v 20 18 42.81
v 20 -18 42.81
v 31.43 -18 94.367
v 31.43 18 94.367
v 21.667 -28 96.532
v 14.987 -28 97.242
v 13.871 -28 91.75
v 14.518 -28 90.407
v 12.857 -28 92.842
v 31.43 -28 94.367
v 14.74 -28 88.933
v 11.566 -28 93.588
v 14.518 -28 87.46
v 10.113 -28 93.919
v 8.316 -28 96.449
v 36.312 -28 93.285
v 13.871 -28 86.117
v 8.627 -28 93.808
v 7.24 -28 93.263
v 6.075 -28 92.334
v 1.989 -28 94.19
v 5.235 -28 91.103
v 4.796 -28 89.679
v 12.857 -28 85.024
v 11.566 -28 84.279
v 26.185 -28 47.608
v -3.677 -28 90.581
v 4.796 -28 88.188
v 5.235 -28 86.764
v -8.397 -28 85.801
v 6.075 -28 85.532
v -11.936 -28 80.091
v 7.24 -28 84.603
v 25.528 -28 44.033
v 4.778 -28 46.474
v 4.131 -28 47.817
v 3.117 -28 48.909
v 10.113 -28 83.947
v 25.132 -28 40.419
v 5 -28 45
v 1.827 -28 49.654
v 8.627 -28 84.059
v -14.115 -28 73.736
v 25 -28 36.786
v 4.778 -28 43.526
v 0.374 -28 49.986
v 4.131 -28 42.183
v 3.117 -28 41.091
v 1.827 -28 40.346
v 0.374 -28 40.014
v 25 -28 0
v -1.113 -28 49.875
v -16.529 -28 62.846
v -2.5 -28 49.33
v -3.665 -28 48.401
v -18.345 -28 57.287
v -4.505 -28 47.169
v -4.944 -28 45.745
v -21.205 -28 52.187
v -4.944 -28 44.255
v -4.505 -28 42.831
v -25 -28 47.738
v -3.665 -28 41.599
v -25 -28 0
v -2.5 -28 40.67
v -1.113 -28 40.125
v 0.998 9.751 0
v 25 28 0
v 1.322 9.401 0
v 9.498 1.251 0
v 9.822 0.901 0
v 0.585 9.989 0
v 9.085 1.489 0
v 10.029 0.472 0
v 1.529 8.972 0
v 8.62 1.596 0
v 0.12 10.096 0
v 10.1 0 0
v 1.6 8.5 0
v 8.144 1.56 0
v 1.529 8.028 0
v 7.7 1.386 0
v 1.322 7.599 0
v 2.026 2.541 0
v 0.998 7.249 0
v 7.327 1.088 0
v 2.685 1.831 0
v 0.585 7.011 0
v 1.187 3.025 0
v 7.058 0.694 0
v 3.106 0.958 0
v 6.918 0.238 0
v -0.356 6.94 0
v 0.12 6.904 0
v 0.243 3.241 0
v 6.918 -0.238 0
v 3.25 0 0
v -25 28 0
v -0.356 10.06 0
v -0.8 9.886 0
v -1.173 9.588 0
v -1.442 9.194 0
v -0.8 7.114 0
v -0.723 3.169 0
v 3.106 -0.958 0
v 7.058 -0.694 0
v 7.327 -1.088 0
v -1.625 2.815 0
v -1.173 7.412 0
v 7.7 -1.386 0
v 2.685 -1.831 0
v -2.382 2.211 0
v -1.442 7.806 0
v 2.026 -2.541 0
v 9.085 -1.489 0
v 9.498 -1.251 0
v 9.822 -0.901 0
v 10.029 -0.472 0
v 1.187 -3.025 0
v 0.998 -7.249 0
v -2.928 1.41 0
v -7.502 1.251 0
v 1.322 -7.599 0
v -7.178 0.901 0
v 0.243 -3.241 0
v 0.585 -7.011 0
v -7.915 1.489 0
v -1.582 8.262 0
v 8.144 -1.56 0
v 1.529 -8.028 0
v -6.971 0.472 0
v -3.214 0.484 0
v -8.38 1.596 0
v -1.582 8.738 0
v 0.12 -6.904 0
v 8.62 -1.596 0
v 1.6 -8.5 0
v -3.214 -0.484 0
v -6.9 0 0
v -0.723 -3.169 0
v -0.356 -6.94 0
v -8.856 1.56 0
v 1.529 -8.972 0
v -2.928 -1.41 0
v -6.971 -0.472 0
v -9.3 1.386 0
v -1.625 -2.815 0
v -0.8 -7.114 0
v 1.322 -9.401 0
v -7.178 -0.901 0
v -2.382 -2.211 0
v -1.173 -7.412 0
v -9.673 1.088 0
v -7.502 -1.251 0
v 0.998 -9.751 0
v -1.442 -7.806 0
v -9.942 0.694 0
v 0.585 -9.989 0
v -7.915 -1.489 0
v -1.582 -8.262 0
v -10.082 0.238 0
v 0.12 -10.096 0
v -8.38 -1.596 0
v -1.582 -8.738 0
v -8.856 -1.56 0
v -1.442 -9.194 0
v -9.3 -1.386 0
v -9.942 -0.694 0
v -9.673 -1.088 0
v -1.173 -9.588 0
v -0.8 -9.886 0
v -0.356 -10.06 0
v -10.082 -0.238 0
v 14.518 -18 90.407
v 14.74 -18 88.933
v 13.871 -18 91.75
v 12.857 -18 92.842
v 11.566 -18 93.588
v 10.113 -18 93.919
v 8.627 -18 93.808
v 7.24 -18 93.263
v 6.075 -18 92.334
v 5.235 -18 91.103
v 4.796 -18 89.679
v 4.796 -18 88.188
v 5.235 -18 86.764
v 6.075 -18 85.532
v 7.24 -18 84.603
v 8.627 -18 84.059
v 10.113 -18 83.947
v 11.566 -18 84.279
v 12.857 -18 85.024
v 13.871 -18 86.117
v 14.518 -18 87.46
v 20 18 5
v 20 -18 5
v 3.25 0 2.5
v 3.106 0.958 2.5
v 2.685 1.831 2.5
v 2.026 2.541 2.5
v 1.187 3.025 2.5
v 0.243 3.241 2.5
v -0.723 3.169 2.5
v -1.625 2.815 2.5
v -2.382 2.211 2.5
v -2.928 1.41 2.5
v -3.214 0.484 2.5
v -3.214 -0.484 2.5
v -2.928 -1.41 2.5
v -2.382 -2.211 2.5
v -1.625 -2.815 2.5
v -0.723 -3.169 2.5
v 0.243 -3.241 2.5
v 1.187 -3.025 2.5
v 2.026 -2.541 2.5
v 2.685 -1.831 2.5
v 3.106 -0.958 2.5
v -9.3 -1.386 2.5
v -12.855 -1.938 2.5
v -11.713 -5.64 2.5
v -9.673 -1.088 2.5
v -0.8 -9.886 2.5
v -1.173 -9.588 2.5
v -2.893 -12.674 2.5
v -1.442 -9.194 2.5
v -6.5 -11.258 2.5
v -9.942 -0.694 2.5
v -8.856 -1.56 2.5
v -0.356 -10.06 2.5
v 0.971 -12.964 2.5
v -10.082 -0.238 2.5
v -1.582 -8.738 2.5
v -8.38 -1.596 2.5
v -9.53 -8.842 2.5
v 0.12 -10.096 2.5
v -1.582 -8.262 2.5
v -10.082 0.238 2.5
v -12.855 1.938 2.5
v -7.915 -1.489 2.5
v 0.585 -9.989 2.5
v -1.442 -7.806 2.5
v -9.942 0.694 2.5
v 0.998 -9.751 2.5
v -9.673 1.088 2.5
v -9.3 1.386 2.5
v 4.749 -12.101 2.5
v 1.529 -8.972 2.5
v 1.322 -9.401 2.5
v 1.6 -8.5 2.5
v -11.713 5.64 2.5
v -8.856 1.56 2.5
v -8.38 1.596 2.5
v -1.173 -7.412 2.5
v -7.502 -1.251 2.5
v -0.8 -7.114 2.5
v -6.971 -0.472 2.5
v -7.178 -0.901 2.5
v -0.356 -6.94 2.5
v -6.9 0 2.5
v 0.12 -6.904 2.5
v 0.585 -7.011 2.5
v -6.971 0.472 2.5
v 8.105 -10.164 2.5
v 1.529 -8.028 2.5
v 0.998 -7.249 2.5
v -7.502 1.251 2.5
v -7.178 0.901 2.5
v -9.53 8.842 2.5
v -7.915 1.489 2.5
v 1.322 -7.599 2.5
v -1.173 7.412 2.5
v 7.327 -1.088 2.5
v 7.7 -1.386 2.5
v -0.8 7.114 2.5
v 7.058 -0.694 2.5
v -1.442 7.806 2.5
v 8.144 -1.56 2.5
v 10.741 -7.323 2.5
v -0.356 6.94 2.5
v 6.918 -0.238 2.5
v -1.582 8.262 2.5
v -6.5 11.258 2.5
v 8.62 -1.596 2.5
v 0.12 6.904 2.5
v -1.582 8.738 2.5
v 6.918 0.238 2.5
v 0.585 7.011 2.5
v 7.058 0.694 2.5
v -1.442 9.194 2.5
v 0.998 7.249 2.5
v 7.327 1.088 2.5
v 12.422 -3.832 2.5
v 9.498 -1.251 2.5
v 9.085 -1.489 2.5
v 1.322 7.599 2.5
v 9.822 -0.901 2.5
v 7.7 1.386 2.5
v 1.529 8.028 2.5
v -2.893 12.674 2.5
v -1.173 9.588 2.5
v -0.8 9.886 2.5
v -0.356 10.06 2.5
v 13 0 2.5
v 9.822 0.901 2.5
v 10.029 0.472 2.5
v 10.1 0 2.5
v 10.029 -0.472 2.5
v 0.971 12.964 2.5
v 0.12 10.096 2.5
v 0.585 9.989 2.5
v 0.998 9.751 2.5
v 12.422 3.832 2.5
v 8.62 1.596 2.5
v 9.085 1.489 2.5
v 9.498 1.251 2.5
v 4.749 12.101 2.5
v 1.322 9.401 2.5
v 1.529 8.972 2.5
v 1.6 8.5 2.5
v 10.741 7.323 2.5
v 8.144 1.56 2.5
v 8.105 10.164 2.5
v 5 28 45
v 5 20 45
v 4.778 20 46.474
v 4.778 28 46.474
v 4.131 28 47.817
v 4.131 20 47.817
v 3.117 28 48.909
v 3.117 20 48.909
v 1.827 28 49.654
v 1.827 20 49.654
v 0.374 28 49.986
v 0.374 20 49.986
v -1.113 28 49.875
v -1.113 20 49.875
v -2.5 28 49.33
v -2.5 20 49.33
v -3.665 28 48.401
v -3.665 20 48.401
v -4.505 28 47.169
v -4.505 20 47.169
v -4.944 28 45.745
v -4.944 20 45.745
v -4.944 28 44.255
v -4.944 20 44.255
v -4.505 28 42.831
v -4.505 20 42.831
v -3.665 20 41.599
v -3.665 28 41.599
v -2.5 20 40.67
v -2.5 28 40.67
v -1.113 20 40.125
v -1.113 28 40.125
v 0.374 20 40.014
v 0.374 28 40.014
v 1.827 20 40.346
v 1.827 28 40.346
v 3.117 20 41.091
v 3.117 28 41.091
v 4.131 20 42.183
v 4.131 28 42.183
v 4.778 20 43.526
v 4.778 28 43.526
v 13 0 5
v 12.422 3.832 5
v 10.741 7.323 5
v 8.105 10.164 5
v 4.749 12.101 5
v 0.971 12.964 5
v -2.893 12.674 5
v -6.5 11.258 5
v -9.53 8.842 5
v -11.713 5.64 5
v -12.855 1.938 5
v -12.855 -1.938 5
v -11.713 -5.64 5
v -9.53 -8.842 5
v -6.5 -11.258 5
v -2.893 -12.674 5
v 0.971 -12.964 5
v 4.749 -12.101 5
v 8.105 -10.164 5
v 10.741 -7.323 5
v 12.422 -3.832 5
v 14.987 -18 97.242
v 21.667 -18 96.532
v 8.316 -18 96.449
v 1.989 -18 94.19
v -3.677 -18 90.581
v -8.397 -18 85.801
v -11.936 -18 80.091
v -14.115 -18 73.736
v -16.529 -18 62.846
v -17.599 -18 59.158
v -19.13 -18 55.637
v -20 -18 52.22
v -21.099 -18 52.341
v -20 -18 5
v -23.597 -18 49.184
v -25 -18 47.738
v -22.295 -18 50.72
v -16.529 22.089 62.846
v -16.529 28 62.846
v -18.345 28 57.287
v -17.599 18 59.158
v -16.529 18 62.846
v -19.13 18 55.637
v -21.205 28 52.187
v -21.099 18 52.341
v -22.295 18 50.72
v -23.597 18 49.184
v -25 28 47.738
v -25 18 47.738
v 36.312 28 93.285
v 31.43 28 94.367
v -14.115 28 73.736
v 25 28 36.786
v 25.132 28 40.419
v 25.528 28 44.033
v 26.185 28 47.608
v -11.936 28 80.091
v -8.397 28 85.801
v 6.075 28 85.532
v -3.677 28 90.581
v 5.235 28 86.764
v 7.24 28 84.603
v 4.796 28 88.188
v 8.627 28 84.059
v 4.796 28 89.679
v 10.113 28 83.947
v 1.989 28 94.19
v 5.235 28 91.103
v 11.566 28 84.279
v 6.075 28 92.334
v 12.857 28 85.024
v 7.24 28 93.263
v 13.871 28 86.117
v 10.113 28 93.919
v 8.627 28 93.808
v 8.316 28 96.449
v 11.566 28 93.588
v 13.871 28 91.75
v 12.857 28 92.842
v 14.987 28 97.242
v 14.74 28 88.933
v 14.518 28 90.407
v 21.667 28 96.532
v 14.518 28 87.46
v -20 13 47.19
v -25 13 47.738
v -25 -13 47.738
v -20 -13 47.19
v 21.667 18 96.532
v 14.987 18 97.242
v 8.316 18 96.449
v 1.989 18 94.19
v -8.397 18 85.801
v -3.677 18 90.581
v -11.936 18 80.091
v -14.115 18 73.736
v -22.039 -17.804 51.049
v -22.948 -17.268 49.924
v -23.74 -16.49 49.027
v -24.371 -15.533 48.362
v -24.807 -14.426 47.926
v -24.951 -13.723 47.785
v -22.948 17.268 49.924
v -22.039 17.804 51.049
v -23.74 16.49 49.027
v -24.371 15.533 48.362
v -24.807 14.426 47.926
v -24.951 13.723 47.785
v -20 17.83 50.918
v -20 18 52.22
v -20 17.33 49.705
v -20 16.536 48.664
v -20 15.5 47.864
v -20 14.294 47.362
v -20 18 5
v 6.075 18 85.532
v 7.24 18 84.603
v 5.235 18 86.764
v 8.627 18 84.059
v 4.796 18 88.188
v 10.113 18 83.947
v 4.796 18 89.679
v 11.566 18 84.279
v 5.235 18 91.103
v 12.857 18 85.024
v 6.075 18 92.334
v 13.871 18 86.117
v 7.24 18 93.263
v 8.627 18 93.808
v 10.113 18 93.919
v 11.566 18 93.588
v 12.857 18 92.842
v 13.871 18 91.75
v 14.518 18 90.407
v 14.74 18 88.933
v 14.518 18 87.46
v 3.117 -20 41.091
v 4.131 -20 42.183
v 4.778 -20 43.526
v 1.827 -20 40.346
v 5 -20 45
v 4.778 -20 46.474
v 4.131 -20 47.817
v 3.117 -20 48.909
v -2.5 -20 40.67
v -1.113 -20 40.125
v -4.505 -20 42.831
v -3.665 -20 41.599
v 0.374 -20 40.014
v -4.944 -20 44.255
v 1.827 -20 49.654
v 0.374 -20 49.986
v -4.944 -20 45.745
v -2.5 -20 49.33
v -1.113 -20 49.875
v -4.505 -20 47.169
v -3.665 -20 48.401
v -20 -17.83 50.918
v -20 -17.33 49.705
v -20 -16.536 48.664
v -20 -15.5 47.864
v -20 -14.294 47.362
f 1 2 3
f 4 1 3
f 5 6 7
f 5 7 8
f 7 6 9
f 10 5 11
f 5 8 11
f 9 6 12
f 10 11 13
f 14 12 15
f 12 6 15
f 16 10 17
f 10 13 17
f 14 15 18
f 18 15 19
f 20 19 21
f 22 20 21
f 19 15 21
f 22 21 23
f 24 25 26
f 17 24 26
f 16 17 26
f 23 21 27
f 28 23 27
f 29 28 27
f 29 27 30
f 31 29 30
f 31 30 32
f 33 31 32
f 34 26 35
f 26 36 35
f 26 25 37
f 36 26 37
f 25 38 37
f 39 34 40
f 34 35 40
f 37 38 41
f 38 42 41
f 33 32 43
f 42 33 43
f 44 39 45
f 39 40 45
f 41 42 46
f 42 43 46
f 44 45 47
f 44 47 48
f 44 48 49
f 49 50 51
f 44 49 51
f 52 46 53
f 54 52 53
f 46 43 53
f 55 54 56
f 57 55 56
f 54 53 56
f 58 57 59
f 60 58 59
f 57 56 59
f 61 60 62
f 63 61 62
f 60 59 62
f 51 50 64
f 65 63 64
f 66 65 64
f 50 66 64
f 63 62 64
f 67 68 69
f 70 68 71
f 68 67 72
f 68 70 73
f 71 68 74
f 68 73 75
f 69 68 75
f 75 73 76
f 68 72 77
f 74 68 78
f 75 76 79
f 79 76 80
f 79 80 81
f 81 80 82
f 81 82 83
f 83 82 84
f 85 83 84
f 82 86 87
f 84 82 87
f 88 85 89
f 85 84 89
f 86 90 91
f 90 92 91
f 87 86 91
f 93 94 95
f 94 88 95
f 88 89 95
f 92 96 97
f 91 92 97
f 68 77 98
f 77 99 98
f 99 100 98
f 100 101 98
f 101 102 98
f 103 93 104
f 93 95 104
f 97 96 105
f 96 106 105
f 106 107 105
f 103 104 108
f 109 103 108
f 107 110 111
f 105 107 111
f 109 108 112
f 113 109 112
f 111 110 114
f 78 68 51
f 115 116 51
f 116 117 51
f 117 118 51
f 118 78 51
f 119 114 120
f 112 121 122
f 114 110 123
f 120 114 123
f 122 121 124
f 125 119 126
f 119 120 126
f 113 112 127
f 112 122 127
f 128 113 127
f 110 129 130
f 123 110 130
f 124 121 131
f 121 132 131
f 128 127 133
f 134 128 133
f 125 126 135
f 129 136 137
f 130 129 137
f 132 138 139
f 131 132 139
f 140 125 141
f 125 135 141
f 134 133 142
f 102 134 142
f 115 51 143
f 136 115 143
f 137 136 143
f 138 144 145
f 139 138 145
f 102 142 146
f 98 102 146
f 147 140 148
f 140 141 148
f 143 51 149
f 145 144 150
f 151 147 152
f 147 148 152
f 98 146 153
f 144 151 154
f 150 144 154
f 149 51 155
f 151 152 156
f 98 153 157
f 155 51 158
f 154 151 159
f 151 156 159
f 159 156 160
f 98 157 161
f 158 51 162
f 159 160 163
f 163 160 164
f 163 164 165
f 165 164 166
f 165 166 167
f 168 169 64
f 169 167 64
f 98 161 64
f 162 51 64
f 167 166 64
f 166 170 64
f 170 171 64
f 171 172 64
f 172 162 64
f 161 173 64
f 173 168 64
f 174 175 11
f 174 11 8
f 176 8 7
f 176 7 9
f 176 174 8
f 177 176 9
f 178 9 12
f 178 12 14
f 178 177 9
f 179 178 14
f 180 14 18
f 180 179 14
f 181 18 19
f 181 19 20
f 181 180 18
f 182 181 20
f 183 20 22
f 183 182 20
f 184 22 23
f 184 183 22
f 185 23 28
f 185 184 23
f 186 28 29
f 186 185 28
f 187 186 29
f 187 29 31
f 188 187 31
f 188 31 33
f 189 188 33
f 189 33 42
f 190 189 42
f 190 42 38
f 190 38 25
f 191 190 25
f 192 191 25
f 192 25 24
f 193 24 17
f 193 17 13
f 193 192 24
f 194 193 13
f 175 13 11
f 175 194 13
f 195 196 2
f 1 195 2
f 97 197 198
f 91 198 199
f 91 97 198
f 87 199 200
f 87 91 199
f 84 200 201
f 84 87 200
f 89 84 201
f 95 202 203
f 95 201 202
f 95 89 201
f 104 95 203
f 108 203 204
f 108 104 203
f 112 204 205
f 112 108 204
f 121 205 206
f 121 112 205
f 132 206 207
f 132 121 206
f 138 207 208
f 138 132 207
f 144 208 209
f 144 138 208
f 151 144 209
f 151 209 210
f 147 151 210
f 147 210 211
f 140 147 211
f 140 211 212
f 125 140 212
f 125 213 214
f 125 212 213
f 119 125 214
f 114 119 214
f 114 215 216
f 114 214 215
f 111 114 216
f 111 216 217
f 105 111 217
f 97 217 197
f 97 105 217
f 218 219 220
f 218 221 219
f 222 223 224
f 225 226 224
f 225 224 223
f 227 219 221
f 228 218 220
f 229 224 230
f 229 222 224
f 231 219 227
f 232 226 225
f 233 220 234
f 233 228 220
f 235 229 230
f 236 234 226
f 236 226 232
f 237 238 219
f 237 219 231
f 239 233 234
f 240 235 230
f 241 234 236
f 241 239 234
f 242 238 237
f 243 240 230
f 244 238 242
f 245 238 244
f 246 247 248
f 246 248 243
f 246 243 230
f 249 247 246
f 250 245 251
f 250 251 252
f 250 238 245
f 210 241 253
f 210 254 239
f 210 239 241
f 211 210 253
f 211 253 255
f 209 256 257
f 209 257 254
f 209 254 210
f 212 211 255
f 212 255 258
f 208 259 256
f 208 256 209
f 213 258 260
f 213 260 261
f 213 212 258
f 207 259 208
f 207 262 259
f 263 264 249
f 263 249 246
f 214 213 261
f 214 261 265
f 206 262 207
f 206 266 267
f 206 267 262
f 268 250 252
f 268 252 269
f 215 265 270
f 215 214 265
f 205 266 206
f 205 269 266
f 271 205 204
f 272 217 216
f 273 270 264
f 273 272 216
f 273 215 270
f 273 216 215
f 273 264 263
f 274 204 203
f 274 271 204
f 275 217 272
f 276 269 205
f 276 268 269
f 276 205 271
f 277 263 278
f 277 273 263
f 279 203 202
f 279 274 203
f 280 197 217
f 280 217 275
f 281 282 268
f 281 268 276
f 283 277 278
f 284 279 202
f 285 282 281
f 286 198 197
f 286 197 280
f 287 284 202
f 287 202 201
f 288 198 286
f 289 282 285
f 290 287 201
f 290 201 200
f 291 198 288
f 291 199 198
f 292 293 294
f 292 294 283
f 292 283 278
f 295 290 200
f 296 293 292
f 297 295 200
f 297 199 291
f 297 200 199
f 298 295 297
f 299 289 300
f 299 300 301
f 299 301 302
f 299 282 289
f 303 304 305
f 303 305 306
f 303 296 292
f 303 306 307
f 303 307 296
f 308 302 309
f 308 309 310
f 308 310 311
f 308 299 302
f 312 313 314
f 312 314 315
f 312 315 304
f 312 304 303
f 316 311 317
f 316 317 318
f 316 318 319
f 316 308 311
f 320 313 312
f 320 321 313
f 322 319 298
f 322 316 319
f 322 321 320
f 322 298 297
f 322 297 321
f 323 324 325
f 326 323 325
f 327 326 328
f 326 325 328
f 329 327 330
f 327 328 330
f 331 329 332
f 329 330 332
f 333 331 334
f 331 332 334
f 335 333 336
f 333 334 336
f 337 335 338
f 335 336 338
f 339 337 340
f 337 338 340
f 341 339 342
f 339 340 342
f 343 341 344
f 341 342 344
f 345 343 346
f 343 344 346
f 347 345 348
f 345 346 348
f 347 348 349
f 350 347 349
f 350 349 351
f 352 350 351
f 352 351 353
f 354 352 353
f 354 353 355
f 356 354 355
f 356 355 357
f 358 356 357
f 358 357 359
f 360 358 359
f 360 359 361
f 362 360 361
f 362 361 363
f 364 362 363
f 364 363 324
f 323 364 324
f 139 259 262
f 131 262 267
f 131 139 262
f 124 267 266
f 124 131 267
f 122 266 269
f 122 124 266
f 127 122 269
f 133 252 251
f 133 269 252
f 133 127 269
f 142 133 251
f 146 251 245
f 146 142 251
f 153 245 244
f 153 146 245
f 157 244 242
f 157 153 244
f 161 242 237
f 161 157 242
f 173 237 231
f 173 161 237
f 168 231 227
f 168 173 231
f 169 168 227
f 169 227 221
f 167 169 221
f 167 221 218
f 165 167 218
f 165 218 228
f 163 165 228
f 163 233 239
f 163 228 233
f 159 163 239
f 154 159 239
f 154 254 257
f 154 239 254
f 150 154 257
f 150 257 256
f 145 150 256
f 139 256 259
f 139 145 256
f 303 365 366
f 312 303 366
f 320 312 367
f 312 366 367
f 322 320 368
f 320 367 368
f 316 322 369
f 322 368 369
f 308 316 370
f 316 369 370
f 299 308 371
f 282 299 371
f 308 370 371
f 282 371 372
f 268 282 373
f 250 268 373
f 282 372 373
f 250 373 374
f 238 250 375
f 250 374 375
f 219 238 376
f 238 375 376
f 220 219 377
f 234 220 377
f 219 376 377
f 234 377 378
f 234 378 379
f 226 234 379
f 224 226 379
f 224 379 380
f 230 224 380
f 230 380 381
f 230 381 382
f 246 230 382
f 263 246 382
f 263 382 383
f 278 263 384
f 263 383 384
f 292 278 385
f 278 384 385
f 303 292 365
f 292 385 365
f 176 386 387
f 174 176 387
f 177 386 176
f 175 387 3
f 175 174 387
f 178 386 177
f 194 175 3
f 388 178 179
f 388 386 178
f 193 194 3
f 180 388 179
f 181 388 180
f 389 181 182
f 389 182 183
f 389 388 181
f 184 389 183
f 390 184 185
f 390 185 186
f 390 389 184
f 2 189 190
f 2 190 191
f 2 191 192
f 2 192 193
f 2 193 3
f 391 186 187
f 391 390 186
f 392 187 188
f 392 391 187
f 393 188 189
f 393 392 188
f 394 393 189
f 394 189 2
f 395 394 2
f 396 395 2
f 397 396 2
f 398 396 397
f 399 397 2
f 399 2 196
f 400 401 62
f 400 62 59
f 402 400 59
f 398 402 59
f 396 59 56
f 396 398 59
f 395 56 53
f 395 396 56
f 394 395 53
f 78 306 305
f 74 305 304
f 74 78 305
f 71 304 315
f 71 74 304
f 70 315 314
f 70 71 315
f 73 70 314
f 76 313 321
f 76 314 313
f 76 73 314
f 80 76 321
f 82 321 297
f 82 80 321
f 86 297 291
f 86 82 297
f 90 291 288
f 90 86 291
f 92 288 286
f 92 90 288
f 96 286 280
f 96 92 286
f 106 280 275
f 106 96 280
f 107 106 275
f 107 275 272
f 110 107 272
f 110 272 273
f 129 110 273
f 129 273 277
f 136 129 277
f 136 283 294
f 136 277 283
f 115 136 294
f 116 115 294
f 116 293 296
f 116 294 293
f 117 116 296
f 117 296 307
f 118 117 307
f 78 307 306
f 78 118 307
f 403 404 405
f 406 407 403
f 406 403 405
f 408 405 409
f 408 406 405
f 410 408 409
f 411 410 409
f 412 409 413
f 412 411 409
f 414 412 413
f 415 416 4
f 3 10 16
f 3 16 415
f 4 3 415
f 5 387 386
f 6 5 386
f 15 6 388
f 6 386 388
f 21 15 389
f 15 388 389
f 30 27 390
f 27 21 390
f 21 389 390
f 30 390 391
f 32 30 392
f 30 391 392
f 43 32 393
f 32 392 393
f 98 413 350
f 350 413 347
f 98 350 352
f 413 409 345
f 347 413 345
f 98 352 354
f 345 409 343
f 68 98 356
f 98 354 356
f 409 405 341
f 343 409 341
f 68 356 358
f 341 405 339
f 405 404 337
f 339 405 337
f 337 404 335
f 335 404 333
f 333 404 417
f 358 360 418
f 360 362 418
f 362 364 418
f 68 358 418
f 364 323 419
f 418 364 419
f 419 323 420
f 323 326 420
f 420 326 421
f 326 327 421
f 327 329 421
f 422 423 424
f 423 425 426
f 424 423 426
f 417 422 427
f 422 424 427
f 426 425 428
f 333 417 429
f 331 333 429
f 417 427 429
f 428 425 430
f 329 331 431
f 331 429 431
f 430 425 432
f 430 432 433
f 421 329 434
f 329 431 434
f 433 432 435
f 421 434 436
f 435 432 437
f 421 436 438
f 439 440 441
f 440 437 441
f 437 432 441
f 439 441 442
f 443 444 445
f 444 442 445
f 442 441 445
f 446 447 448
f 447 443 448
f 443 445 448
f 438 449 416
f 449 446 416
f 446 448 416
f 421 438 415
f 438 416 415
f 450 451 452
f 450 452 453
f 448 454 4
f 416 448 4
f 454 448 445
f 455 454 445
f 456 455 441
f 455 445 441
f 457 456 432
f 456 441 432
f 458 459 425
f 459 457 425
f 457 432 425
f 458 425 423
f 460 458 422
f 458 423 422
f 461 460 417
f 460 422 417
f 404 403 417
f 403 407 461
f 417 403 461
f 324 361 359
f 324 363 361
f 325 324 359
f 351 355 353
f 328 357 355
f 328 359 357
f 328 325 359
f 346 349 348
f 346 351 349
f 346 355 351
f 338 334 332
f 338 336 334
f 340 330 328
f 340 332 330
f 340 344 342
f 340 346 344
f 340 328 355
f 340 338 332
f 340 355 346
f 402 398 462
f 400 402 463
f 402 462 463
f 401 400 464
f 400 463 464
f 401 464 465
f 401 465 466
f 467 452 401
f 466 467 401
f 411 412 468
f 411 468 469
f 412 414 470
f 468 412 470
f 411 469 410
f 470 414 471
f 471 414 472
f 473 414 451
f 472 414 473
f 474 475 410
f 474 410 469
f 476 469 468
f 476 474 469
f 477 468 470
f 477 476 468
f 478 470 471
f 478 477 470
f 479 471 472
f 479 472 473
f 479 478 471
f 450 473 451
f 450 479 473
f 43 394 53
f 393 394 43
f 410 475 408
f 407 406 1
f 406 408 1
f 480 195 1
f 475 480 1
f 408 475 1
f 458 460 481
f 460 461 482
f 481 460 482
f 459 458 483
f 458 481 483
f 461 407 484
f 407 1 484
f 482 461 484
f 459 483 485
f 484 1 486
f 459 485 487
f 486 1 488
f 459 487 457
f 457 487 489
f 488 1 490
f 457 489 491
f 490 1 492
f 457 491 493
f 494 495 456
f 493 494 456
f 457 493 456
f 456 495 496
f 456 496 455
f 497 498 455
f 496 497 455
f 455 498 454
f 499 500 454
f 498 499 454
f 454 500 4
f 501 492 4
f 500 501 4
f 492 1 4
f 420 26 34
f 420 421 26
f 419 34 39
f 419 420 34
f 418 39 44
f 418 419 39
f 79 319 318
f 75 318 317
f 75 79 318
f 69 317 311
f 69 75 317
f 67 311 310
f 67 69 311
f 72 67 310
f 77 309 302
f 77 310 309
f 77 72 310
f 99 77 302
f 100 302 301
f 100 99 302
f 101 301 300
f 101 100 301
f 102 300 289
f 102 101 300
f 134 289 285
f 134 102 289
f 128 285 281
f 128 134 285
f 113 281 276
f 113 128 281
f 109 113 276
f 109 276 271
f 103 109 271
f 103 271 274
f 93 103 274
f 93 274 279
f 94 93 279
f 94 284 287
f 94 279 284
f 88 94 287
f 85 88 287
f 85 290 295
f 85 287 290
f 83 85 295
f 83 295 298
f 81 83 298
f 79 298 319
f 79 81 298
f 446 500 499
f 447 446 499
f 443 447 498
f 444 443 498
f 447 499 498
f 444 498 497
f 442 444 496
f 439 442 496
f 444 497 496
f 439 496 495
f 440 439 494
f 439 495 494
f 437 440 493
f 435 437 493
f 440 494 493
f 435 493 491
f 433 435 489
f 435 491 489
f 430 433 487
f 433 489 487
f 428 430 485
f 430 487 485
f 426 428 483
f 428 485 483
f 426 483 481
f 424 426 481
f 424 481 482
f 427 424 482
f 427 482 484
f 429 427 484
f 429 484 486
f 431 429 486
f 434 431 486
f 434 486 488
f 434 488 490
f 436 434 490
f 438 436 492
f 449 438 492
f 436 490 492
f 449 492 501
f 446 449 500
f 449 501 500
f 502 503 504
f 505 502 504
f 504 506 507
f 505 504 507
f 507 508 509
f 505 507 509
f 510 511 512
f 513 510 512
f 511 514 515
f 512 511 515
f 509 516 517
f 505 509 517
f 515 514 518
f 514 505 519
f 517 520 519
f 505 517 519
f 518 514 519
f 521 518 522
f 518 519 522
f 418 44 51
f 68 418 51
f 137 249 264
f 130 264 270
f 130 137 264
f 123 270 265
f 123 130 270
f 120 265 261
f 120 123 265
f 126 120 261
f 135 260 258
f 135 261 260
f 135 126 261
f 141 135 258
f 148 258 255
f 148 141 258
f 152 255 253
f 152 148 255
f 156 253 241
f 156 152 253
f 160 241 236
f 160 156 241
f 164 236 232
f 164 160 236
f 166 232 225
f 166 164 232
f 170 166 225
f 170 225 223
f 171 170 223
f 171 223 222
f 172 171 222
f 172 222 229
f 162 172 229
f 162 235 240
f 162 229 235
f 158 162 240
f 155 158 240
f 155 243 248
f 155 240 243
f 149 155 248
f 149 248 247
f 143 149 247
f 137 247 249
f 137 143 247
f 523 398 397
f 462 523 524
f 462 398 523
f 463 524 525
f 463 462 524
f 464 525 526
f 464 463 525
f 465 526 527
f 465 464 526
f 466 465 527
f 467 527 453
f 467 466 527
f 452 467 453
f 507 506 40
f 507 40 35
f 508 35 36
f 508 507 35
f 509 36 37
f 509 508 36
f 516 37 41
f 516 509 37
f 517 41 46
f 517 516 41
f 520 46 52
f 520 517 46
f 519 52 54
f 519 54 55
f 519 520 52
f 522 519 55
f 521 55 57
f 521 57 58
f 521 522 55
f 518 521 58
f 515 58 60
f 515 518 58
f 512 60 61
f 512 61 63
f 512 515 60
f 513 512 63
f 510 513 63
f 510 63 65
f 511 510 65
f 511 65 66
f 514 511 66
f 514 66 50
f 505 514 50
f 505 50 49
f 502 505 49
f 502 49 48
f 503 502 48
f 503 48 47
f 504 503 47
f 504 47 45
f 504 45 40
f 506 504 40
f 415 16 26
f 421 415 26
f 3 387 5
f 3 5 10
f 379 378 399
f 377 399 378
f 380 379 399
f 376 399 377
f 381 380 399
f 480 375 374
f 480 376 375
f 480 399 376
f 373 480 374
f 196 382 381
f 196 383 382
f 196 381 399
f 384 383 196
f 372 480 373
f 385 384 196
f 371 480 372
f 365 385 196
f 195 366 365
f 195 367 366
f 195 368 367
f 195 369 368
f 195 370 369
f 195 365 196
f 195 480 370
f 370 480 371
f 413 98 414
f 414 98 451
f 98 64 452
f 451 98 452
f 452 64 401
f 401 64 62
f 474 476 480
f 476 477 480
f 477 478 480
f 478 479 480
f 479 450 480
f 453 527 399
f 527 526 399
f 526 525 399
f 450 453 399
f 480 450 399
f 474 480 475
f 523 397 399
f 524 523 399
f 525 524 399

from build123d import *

# Parameters (mm, degrees)
SKETCH_1_W          = 40
SKETCH_1_H          = 36
SKETCH_1_R          = 1.6
SKETCH_1_R_2        = 3.25
EXTRUDE_1_DEPTH     = 5
SKETCH_2_R          = 13
CUT_EXTRUDE_1_DEPTH = 2.5
SKETCH_7_R          = 5
EXTRUDE_2_DEPTH     = 10
SKETCH_10_R         = 5
EXTRUDE_4_DEPTH     = 2
EXTRUDE_3_REACH     = 123.4
FILLET_1_R          = 30
FILLET_2_R          = 50
FILLET_6_R          = 5


with BuildPart() as part:
    # ｽｹｯﾁ1 → ﾎﾞｽ - 押し出し1 (new body)
    with BuildSketch(Plane.XY):
        Rectangle(SKETCH_1_W, SKETCH_1_H)
        with Locations((0, 8.5)):
            Circle(SKETCH_1_R, mode=Mode.SUBTRACT)
        with Locations((8.5, 0)):
            Circle(SKETCH_1_R, mode=Mode.SUBTRACT)
        with Locations((0, -8.5)):
            Circle(SKETCH_1_R, mode=Mode.SUBTRACT)
        with Locations((-8.5, 0)):
            Circle(SKETCH_1_R, mode=Mode.SUBTRACT)
        Circle(SKETCH_1_R_2, mode=Mode.SUBTRACT)
    extrude(amount=EXTRUDE_1_DEPTH)

    # ｽｹｯﾁ2 → ｶｯﾄ - 押し出し1 (cut)
    with BuildSketch(Plane.XY.offset(5)):
        Circle(SKETCH_2_R)
    extrude(amount=-CUT_EXTRUDE_1_DEPTH, mode=Mode.SUBTRACT)

    # ｽｹｯﾁ7 → ﾎﾞｽ - 押し出し2 (add)
    with BuildSketch(Plane.XZ.offset(18)):
        Polygon((-20, 0), (-20, 47.190356234), (-7.621741376, 103.02507267), (31.430098909, 94.367488113), (20, 42.809643766), (20, 0), align=None)
        with Locations((0, 45)):
            Circle(SKETCH_7_R, mode=Mode.SUBTRACT)
        with Locations((9.739782627, 88.93332032)):
            Circle(SKETCH_7_R, mode=Mode.SUBTRACT)
    extrude_2 = extrude(amount=EXTRUDE_2_DEPTH)

    # ｽｹｯﾁ10 → ﾎﾞｽ - 押し出し4 (add)
    with BuildSketch(Plane(origin=(0, -18, 0), x_dir=(1, 0, 0), z_dir=(0, 1, 0))):
        with Locations(Location((0, -45, 0), (0, 0, 180))):
            Circle(SKETCH_10_R)
    extrude_4 = extrude(amount=-EXTRUDE_4_DEPTH)

    # ﾐﾗｰ3: ﾎﾞｽ - 押し出し2, ﾎﾞｽ - 押し出し4 across plane
    add(extrude_2.mirror(Plane.ZX))
    add(extrude_4.mirror(Plane.ZX))

    # ﾎﾞｽ - 押し出し3: up to this face of the body (flat: up to its plane)
    extrude_3_end = Plane(part.part.faces().sort_by_distance((-18.848513106, 28, 23.595178117))[0])
    # ｽｹｯﾁ8 → ﾎﾞｽ - 押し出し3 (add, up to the picked face)
    with BuildSketch(Plane.XZ.offset(28), mode=Mode.PRIVATE) as extrude_3_sk1:
        Polygon((-20, 47.190356234), (-20, 0), (-25, 0), (-25, 47.737945292), align=None)
    extrude_3_tool1 = split(extrude(extrude_3_sk1.sketch, amount=-EXTRUDE_3_REACH, mode=Mode.PRIVATE), bisect_by=extrude_3_end, keep=Keep.BOTH, mode=Mode.PRIVATE)
    # ｽｹｯﾁ8 → ﾎﾞｽ - 押し出し3 (add, up to the picked face)
    with BuildSketch(Plane.XZ.offset(28), mode=Mode.PRIVATE) as extrude_3_sk2:
        Polygon((20, 42.809643766), (31.430098909, 94.367488113), (36.311578945, 93.285290043), (25, 42.262054708), (25, 0), (20, 0), align=None)
    extrude_3_tool2 = split(extrude(extrude_3_sk2.sketch, amount=-EXTRUDE_3_REACH, mode=Mode.PRIVATE), bisect_by=extrude_3_end, keep=Keep.BOTH, mode=Mode.PRIVATE)
    add(extrude_3_tool1.solids().sort_by(Axis((-22.504807, -28, 23.732339), (0, 1, 0)))[0])
    add(extrude_3_tool2.solids().sort_by(Axis((25.636945, -28, 47.192298), (0, 1, 0)))[0])

    # ﾌｨﾚｯﾄ1
    # the kernel refuses this fillet: 30 mm, written as the material it adds along each edge
    with BuildSketch(Plane(origin=(-20, 22.088837233, 47.190356234), x_dir=(0.2164396139380964, 0, 0.9762960071199349), z_dir=(0, -1, 0))) as fillet_1_piece_1_section:
        with BuildLine():
            CenterArc((16.035534893, 30), FILLET_1_R, 236.442690238, 33.557309762)
            Line((-0.547589058, 5), (0, 0))
            Line((0, 0), (16.035534893, 0))
        make_face()
    fillet_1_piece_1 = extrude(amount=90.177674467, mode=Mode.PRIVATE)
    fillet_1_piece_1 = split(fillet_1_piece_1, bisect_by=Plane(origin=(-20, 18, 47.190356234), z_dir=(0, 1, 0)), keep=Keep.TOP, mode=Mode.PRIVATE)
    add(fillet_1_piece_1)
    with BuildSketch(Plane(origin=(-20, -18, 47.190356234), x_dir=(0.2164396139380964, 0, 0.9762960071199349), z_dir=(0, -1, 0))) as fillet_1_piece_2:
        with BuildLine():
            CenterArc((16.035534893, 30), FILLET_1_R, 236.442690238, 33.557309762)
            Line((-0.547589058, 5), (0, 0))
            Line((0, 0), (16.035534893, 0))
        make_face()
    extrude(amount=10)
    with BuildSketch(Plane(origin=(-20, -22.088837233, 47.190356234), x_dir=(-0.9940563382222736, 0, 0.10886687485238501), z_dir=(0, 1, 0))) as fillet_1_piece_3_section:
        with BuildLine():
            CenterArc((28.075951576, 19.206231343), FILLET_1_R, 186.25, 33.557309762)
            Line((-1.74573857, 15.940225098), (0, 0))
            Line((0, 0), (5.029896001, 0))
        make_face()
    fillet_1_piece_3 = extrude(amount=90.177674467, mode=Mode.PRIVATE)
    fillet_1_piece_3 = split(fillet_1_piece_3, bisect_by=Plane(origin=(-20, -18, 47.190356234), z_dir=(0, -1, 0)), keep=Keep.TOP, mode=Mode.PRIVATE)
    add(fillet_1_piece_3)
    with BuildSketch(Plane(origin=(-20, 18, 47.190356234), x_dir=(-0.9940563382222736, 0, 0.10886687485238501), z_dir=(0, 1, 0))) as fillet_1_piece_4:
        with BuildLine():
            CenterArc((28.075951576, 19.206231343), FILLET_1_R, 186.25, 33.557309762)
            Line((-1.74573857, 15.940225098), (0, 0))
            Line((0, 0), (5.029896001, 0))
        make_face()
    extrude(amount=10)
    # the kernel refuses this fillet: 30 mm, written as the material it takes off along each edge
    with BuildSketch(Plane(origin=(-7.621741376, 57, 103.02507267), x_dir=(0.9762960071199346, 0, -0.21643961393809735), z_dir=(0, -1, 0))) as fillet_1_2_piece_1:
        with BuildLine():
            CenterArc((FILLET_1_R, -FILLET_1_R), FILLET_1_R, 90, 90)
            Line((0, -FILLET_1_R), (0, 0))
            Line((0, 0), (FILLET_1_R, 0))
        make_face()
    extrude(amount=160, mode=Mode.SUBTRACT)
    with BuildSketch(Plane(origin=(-7.621741376, -57, 103.02507267), x_dir=(0.9762960071199348, 0, -0.21643961393809644), z_dir=(0, 1, 0))) as fillet_1_2_piece_2:
        with BuildLine():
            CenterArc((FILLET_1_R, FILLET_1_R), FILLET_1_R, 180, 90)
            Line((0, FILLET_1_R), (0, 0))
            Line((0, 0), (FILLET_1_R, 0))
        make_face()
    extrude(amount=160, mode=Mode.SUBTRACT)

    # ﾌｨﾚｯﾄ2
    fillet_2_edges = [part.edges().sort_by_distance(p)[0] for p in [
        (25, 0, 42.262054708),
    ]]
    fillet(fillet_2_edges, radius=FILLET_2_R)

    # ﾌｨﾚｯﾄ6
    # the kernel refuses this fillet: 5 mm, written as the material it adds along each edge
    with BuildSketch(Plane(origin=(-7.574295772, 18, 45.829520298), x_dir=(0.10886687485234858, 0, 0.9940563382222776), z_dir=(-0.9940563382222776, 0, 0.1088668748523486))) as fillet_6_piece_1_section:
        with BuildLine():
            CenterArc((FILLET_6_R, -FILLET_6_R), FILLET_6_R, 90, 90)
            Line((0, -FILLET_6_R), (0, 0))
            Line((0, 0), (FILLET_6_R, 0))
        make_face()
    fillet_6_piece_1 = extrude(amount=30.029896001, mode=Mode.PRIVATE)
    fillet_6_piece_1 = split(fillet_6_piece_1, bisect_by=Plane(origin=(-25, 18, 45.829520298), z_dir=(1, 0, 0)), keep=Keep.TOP, mode=Mode.PRIVATE)
    fillet_6_piece_1 = fillet_6_piece_1 - Plane(origin=(-45.818155232, 18, 69.33897334), x_dir=(-0.9940563382223121, 0, 0.10886687485203418), z_dir=(0, -1, 0)) * Cylinder(30, 81, mode=Mode.PRIVATE)
    fillet_6_piece_1 = split(fillet_6_piece_1, bisect_by=Plane(origin=(-20, 18, 45.829520298), z_dir=(-1, 0, 0)), keep=Keep.TOP, mode=Mode.PRIVATE)
    add(fillet_6_piece_1)
    with BuildSketch(Plane(origin=(-37.425704228, -18, 49.098781228), x_dir=(0.10886687485234857, 0, 0.9940563382222776), z_dir=(0.9940563382222777, 0, -0.10886687485234858))) as fillet_6_piece_2_section:
        with BuildLine():
            CenterArc((FILLET_6_R, -FILLET_6_R), FILLET_6_R, 90, 90)
            Line((0, -FILLET_6_R), (0, 0))
            Line((0, 0), (FILLET_6_R, 0))
        make_face()
    fillet_6_piece_2 = extrude(amount=30.029896001, mode=Mode.PRIVATE)
    fillet_6_piece_2 = split(fillet_6_piece_2, bisect_by=Plane(origin=(-25, -18, 49.098781228), z_dir=(1, 0, 0)), keep=Keep.TOP, mode=Mode.PRIVATE)
    fillet_6_piece_2 = split(fillet_6_piece_2, bisect_by=Plane(origin=(-20, -18, 49.098781228), z_dir=(-1, 0, 0)), keep=Keep.TOP, mode=Mode.PRIVATE)
    fillet_6_piece_2 = fillet_6_piece_2 - Plane(origin=(-45.818155232, -18, 69.33897334), x_dir=(0.21643961393799077, 0, 0.9762960071199583), z_dir=(0, 1, 0)) * Cylinder(30, 81, mode=Mode.PRIVATE)
    add(fillet_6_piece_2)


solid = part.part
